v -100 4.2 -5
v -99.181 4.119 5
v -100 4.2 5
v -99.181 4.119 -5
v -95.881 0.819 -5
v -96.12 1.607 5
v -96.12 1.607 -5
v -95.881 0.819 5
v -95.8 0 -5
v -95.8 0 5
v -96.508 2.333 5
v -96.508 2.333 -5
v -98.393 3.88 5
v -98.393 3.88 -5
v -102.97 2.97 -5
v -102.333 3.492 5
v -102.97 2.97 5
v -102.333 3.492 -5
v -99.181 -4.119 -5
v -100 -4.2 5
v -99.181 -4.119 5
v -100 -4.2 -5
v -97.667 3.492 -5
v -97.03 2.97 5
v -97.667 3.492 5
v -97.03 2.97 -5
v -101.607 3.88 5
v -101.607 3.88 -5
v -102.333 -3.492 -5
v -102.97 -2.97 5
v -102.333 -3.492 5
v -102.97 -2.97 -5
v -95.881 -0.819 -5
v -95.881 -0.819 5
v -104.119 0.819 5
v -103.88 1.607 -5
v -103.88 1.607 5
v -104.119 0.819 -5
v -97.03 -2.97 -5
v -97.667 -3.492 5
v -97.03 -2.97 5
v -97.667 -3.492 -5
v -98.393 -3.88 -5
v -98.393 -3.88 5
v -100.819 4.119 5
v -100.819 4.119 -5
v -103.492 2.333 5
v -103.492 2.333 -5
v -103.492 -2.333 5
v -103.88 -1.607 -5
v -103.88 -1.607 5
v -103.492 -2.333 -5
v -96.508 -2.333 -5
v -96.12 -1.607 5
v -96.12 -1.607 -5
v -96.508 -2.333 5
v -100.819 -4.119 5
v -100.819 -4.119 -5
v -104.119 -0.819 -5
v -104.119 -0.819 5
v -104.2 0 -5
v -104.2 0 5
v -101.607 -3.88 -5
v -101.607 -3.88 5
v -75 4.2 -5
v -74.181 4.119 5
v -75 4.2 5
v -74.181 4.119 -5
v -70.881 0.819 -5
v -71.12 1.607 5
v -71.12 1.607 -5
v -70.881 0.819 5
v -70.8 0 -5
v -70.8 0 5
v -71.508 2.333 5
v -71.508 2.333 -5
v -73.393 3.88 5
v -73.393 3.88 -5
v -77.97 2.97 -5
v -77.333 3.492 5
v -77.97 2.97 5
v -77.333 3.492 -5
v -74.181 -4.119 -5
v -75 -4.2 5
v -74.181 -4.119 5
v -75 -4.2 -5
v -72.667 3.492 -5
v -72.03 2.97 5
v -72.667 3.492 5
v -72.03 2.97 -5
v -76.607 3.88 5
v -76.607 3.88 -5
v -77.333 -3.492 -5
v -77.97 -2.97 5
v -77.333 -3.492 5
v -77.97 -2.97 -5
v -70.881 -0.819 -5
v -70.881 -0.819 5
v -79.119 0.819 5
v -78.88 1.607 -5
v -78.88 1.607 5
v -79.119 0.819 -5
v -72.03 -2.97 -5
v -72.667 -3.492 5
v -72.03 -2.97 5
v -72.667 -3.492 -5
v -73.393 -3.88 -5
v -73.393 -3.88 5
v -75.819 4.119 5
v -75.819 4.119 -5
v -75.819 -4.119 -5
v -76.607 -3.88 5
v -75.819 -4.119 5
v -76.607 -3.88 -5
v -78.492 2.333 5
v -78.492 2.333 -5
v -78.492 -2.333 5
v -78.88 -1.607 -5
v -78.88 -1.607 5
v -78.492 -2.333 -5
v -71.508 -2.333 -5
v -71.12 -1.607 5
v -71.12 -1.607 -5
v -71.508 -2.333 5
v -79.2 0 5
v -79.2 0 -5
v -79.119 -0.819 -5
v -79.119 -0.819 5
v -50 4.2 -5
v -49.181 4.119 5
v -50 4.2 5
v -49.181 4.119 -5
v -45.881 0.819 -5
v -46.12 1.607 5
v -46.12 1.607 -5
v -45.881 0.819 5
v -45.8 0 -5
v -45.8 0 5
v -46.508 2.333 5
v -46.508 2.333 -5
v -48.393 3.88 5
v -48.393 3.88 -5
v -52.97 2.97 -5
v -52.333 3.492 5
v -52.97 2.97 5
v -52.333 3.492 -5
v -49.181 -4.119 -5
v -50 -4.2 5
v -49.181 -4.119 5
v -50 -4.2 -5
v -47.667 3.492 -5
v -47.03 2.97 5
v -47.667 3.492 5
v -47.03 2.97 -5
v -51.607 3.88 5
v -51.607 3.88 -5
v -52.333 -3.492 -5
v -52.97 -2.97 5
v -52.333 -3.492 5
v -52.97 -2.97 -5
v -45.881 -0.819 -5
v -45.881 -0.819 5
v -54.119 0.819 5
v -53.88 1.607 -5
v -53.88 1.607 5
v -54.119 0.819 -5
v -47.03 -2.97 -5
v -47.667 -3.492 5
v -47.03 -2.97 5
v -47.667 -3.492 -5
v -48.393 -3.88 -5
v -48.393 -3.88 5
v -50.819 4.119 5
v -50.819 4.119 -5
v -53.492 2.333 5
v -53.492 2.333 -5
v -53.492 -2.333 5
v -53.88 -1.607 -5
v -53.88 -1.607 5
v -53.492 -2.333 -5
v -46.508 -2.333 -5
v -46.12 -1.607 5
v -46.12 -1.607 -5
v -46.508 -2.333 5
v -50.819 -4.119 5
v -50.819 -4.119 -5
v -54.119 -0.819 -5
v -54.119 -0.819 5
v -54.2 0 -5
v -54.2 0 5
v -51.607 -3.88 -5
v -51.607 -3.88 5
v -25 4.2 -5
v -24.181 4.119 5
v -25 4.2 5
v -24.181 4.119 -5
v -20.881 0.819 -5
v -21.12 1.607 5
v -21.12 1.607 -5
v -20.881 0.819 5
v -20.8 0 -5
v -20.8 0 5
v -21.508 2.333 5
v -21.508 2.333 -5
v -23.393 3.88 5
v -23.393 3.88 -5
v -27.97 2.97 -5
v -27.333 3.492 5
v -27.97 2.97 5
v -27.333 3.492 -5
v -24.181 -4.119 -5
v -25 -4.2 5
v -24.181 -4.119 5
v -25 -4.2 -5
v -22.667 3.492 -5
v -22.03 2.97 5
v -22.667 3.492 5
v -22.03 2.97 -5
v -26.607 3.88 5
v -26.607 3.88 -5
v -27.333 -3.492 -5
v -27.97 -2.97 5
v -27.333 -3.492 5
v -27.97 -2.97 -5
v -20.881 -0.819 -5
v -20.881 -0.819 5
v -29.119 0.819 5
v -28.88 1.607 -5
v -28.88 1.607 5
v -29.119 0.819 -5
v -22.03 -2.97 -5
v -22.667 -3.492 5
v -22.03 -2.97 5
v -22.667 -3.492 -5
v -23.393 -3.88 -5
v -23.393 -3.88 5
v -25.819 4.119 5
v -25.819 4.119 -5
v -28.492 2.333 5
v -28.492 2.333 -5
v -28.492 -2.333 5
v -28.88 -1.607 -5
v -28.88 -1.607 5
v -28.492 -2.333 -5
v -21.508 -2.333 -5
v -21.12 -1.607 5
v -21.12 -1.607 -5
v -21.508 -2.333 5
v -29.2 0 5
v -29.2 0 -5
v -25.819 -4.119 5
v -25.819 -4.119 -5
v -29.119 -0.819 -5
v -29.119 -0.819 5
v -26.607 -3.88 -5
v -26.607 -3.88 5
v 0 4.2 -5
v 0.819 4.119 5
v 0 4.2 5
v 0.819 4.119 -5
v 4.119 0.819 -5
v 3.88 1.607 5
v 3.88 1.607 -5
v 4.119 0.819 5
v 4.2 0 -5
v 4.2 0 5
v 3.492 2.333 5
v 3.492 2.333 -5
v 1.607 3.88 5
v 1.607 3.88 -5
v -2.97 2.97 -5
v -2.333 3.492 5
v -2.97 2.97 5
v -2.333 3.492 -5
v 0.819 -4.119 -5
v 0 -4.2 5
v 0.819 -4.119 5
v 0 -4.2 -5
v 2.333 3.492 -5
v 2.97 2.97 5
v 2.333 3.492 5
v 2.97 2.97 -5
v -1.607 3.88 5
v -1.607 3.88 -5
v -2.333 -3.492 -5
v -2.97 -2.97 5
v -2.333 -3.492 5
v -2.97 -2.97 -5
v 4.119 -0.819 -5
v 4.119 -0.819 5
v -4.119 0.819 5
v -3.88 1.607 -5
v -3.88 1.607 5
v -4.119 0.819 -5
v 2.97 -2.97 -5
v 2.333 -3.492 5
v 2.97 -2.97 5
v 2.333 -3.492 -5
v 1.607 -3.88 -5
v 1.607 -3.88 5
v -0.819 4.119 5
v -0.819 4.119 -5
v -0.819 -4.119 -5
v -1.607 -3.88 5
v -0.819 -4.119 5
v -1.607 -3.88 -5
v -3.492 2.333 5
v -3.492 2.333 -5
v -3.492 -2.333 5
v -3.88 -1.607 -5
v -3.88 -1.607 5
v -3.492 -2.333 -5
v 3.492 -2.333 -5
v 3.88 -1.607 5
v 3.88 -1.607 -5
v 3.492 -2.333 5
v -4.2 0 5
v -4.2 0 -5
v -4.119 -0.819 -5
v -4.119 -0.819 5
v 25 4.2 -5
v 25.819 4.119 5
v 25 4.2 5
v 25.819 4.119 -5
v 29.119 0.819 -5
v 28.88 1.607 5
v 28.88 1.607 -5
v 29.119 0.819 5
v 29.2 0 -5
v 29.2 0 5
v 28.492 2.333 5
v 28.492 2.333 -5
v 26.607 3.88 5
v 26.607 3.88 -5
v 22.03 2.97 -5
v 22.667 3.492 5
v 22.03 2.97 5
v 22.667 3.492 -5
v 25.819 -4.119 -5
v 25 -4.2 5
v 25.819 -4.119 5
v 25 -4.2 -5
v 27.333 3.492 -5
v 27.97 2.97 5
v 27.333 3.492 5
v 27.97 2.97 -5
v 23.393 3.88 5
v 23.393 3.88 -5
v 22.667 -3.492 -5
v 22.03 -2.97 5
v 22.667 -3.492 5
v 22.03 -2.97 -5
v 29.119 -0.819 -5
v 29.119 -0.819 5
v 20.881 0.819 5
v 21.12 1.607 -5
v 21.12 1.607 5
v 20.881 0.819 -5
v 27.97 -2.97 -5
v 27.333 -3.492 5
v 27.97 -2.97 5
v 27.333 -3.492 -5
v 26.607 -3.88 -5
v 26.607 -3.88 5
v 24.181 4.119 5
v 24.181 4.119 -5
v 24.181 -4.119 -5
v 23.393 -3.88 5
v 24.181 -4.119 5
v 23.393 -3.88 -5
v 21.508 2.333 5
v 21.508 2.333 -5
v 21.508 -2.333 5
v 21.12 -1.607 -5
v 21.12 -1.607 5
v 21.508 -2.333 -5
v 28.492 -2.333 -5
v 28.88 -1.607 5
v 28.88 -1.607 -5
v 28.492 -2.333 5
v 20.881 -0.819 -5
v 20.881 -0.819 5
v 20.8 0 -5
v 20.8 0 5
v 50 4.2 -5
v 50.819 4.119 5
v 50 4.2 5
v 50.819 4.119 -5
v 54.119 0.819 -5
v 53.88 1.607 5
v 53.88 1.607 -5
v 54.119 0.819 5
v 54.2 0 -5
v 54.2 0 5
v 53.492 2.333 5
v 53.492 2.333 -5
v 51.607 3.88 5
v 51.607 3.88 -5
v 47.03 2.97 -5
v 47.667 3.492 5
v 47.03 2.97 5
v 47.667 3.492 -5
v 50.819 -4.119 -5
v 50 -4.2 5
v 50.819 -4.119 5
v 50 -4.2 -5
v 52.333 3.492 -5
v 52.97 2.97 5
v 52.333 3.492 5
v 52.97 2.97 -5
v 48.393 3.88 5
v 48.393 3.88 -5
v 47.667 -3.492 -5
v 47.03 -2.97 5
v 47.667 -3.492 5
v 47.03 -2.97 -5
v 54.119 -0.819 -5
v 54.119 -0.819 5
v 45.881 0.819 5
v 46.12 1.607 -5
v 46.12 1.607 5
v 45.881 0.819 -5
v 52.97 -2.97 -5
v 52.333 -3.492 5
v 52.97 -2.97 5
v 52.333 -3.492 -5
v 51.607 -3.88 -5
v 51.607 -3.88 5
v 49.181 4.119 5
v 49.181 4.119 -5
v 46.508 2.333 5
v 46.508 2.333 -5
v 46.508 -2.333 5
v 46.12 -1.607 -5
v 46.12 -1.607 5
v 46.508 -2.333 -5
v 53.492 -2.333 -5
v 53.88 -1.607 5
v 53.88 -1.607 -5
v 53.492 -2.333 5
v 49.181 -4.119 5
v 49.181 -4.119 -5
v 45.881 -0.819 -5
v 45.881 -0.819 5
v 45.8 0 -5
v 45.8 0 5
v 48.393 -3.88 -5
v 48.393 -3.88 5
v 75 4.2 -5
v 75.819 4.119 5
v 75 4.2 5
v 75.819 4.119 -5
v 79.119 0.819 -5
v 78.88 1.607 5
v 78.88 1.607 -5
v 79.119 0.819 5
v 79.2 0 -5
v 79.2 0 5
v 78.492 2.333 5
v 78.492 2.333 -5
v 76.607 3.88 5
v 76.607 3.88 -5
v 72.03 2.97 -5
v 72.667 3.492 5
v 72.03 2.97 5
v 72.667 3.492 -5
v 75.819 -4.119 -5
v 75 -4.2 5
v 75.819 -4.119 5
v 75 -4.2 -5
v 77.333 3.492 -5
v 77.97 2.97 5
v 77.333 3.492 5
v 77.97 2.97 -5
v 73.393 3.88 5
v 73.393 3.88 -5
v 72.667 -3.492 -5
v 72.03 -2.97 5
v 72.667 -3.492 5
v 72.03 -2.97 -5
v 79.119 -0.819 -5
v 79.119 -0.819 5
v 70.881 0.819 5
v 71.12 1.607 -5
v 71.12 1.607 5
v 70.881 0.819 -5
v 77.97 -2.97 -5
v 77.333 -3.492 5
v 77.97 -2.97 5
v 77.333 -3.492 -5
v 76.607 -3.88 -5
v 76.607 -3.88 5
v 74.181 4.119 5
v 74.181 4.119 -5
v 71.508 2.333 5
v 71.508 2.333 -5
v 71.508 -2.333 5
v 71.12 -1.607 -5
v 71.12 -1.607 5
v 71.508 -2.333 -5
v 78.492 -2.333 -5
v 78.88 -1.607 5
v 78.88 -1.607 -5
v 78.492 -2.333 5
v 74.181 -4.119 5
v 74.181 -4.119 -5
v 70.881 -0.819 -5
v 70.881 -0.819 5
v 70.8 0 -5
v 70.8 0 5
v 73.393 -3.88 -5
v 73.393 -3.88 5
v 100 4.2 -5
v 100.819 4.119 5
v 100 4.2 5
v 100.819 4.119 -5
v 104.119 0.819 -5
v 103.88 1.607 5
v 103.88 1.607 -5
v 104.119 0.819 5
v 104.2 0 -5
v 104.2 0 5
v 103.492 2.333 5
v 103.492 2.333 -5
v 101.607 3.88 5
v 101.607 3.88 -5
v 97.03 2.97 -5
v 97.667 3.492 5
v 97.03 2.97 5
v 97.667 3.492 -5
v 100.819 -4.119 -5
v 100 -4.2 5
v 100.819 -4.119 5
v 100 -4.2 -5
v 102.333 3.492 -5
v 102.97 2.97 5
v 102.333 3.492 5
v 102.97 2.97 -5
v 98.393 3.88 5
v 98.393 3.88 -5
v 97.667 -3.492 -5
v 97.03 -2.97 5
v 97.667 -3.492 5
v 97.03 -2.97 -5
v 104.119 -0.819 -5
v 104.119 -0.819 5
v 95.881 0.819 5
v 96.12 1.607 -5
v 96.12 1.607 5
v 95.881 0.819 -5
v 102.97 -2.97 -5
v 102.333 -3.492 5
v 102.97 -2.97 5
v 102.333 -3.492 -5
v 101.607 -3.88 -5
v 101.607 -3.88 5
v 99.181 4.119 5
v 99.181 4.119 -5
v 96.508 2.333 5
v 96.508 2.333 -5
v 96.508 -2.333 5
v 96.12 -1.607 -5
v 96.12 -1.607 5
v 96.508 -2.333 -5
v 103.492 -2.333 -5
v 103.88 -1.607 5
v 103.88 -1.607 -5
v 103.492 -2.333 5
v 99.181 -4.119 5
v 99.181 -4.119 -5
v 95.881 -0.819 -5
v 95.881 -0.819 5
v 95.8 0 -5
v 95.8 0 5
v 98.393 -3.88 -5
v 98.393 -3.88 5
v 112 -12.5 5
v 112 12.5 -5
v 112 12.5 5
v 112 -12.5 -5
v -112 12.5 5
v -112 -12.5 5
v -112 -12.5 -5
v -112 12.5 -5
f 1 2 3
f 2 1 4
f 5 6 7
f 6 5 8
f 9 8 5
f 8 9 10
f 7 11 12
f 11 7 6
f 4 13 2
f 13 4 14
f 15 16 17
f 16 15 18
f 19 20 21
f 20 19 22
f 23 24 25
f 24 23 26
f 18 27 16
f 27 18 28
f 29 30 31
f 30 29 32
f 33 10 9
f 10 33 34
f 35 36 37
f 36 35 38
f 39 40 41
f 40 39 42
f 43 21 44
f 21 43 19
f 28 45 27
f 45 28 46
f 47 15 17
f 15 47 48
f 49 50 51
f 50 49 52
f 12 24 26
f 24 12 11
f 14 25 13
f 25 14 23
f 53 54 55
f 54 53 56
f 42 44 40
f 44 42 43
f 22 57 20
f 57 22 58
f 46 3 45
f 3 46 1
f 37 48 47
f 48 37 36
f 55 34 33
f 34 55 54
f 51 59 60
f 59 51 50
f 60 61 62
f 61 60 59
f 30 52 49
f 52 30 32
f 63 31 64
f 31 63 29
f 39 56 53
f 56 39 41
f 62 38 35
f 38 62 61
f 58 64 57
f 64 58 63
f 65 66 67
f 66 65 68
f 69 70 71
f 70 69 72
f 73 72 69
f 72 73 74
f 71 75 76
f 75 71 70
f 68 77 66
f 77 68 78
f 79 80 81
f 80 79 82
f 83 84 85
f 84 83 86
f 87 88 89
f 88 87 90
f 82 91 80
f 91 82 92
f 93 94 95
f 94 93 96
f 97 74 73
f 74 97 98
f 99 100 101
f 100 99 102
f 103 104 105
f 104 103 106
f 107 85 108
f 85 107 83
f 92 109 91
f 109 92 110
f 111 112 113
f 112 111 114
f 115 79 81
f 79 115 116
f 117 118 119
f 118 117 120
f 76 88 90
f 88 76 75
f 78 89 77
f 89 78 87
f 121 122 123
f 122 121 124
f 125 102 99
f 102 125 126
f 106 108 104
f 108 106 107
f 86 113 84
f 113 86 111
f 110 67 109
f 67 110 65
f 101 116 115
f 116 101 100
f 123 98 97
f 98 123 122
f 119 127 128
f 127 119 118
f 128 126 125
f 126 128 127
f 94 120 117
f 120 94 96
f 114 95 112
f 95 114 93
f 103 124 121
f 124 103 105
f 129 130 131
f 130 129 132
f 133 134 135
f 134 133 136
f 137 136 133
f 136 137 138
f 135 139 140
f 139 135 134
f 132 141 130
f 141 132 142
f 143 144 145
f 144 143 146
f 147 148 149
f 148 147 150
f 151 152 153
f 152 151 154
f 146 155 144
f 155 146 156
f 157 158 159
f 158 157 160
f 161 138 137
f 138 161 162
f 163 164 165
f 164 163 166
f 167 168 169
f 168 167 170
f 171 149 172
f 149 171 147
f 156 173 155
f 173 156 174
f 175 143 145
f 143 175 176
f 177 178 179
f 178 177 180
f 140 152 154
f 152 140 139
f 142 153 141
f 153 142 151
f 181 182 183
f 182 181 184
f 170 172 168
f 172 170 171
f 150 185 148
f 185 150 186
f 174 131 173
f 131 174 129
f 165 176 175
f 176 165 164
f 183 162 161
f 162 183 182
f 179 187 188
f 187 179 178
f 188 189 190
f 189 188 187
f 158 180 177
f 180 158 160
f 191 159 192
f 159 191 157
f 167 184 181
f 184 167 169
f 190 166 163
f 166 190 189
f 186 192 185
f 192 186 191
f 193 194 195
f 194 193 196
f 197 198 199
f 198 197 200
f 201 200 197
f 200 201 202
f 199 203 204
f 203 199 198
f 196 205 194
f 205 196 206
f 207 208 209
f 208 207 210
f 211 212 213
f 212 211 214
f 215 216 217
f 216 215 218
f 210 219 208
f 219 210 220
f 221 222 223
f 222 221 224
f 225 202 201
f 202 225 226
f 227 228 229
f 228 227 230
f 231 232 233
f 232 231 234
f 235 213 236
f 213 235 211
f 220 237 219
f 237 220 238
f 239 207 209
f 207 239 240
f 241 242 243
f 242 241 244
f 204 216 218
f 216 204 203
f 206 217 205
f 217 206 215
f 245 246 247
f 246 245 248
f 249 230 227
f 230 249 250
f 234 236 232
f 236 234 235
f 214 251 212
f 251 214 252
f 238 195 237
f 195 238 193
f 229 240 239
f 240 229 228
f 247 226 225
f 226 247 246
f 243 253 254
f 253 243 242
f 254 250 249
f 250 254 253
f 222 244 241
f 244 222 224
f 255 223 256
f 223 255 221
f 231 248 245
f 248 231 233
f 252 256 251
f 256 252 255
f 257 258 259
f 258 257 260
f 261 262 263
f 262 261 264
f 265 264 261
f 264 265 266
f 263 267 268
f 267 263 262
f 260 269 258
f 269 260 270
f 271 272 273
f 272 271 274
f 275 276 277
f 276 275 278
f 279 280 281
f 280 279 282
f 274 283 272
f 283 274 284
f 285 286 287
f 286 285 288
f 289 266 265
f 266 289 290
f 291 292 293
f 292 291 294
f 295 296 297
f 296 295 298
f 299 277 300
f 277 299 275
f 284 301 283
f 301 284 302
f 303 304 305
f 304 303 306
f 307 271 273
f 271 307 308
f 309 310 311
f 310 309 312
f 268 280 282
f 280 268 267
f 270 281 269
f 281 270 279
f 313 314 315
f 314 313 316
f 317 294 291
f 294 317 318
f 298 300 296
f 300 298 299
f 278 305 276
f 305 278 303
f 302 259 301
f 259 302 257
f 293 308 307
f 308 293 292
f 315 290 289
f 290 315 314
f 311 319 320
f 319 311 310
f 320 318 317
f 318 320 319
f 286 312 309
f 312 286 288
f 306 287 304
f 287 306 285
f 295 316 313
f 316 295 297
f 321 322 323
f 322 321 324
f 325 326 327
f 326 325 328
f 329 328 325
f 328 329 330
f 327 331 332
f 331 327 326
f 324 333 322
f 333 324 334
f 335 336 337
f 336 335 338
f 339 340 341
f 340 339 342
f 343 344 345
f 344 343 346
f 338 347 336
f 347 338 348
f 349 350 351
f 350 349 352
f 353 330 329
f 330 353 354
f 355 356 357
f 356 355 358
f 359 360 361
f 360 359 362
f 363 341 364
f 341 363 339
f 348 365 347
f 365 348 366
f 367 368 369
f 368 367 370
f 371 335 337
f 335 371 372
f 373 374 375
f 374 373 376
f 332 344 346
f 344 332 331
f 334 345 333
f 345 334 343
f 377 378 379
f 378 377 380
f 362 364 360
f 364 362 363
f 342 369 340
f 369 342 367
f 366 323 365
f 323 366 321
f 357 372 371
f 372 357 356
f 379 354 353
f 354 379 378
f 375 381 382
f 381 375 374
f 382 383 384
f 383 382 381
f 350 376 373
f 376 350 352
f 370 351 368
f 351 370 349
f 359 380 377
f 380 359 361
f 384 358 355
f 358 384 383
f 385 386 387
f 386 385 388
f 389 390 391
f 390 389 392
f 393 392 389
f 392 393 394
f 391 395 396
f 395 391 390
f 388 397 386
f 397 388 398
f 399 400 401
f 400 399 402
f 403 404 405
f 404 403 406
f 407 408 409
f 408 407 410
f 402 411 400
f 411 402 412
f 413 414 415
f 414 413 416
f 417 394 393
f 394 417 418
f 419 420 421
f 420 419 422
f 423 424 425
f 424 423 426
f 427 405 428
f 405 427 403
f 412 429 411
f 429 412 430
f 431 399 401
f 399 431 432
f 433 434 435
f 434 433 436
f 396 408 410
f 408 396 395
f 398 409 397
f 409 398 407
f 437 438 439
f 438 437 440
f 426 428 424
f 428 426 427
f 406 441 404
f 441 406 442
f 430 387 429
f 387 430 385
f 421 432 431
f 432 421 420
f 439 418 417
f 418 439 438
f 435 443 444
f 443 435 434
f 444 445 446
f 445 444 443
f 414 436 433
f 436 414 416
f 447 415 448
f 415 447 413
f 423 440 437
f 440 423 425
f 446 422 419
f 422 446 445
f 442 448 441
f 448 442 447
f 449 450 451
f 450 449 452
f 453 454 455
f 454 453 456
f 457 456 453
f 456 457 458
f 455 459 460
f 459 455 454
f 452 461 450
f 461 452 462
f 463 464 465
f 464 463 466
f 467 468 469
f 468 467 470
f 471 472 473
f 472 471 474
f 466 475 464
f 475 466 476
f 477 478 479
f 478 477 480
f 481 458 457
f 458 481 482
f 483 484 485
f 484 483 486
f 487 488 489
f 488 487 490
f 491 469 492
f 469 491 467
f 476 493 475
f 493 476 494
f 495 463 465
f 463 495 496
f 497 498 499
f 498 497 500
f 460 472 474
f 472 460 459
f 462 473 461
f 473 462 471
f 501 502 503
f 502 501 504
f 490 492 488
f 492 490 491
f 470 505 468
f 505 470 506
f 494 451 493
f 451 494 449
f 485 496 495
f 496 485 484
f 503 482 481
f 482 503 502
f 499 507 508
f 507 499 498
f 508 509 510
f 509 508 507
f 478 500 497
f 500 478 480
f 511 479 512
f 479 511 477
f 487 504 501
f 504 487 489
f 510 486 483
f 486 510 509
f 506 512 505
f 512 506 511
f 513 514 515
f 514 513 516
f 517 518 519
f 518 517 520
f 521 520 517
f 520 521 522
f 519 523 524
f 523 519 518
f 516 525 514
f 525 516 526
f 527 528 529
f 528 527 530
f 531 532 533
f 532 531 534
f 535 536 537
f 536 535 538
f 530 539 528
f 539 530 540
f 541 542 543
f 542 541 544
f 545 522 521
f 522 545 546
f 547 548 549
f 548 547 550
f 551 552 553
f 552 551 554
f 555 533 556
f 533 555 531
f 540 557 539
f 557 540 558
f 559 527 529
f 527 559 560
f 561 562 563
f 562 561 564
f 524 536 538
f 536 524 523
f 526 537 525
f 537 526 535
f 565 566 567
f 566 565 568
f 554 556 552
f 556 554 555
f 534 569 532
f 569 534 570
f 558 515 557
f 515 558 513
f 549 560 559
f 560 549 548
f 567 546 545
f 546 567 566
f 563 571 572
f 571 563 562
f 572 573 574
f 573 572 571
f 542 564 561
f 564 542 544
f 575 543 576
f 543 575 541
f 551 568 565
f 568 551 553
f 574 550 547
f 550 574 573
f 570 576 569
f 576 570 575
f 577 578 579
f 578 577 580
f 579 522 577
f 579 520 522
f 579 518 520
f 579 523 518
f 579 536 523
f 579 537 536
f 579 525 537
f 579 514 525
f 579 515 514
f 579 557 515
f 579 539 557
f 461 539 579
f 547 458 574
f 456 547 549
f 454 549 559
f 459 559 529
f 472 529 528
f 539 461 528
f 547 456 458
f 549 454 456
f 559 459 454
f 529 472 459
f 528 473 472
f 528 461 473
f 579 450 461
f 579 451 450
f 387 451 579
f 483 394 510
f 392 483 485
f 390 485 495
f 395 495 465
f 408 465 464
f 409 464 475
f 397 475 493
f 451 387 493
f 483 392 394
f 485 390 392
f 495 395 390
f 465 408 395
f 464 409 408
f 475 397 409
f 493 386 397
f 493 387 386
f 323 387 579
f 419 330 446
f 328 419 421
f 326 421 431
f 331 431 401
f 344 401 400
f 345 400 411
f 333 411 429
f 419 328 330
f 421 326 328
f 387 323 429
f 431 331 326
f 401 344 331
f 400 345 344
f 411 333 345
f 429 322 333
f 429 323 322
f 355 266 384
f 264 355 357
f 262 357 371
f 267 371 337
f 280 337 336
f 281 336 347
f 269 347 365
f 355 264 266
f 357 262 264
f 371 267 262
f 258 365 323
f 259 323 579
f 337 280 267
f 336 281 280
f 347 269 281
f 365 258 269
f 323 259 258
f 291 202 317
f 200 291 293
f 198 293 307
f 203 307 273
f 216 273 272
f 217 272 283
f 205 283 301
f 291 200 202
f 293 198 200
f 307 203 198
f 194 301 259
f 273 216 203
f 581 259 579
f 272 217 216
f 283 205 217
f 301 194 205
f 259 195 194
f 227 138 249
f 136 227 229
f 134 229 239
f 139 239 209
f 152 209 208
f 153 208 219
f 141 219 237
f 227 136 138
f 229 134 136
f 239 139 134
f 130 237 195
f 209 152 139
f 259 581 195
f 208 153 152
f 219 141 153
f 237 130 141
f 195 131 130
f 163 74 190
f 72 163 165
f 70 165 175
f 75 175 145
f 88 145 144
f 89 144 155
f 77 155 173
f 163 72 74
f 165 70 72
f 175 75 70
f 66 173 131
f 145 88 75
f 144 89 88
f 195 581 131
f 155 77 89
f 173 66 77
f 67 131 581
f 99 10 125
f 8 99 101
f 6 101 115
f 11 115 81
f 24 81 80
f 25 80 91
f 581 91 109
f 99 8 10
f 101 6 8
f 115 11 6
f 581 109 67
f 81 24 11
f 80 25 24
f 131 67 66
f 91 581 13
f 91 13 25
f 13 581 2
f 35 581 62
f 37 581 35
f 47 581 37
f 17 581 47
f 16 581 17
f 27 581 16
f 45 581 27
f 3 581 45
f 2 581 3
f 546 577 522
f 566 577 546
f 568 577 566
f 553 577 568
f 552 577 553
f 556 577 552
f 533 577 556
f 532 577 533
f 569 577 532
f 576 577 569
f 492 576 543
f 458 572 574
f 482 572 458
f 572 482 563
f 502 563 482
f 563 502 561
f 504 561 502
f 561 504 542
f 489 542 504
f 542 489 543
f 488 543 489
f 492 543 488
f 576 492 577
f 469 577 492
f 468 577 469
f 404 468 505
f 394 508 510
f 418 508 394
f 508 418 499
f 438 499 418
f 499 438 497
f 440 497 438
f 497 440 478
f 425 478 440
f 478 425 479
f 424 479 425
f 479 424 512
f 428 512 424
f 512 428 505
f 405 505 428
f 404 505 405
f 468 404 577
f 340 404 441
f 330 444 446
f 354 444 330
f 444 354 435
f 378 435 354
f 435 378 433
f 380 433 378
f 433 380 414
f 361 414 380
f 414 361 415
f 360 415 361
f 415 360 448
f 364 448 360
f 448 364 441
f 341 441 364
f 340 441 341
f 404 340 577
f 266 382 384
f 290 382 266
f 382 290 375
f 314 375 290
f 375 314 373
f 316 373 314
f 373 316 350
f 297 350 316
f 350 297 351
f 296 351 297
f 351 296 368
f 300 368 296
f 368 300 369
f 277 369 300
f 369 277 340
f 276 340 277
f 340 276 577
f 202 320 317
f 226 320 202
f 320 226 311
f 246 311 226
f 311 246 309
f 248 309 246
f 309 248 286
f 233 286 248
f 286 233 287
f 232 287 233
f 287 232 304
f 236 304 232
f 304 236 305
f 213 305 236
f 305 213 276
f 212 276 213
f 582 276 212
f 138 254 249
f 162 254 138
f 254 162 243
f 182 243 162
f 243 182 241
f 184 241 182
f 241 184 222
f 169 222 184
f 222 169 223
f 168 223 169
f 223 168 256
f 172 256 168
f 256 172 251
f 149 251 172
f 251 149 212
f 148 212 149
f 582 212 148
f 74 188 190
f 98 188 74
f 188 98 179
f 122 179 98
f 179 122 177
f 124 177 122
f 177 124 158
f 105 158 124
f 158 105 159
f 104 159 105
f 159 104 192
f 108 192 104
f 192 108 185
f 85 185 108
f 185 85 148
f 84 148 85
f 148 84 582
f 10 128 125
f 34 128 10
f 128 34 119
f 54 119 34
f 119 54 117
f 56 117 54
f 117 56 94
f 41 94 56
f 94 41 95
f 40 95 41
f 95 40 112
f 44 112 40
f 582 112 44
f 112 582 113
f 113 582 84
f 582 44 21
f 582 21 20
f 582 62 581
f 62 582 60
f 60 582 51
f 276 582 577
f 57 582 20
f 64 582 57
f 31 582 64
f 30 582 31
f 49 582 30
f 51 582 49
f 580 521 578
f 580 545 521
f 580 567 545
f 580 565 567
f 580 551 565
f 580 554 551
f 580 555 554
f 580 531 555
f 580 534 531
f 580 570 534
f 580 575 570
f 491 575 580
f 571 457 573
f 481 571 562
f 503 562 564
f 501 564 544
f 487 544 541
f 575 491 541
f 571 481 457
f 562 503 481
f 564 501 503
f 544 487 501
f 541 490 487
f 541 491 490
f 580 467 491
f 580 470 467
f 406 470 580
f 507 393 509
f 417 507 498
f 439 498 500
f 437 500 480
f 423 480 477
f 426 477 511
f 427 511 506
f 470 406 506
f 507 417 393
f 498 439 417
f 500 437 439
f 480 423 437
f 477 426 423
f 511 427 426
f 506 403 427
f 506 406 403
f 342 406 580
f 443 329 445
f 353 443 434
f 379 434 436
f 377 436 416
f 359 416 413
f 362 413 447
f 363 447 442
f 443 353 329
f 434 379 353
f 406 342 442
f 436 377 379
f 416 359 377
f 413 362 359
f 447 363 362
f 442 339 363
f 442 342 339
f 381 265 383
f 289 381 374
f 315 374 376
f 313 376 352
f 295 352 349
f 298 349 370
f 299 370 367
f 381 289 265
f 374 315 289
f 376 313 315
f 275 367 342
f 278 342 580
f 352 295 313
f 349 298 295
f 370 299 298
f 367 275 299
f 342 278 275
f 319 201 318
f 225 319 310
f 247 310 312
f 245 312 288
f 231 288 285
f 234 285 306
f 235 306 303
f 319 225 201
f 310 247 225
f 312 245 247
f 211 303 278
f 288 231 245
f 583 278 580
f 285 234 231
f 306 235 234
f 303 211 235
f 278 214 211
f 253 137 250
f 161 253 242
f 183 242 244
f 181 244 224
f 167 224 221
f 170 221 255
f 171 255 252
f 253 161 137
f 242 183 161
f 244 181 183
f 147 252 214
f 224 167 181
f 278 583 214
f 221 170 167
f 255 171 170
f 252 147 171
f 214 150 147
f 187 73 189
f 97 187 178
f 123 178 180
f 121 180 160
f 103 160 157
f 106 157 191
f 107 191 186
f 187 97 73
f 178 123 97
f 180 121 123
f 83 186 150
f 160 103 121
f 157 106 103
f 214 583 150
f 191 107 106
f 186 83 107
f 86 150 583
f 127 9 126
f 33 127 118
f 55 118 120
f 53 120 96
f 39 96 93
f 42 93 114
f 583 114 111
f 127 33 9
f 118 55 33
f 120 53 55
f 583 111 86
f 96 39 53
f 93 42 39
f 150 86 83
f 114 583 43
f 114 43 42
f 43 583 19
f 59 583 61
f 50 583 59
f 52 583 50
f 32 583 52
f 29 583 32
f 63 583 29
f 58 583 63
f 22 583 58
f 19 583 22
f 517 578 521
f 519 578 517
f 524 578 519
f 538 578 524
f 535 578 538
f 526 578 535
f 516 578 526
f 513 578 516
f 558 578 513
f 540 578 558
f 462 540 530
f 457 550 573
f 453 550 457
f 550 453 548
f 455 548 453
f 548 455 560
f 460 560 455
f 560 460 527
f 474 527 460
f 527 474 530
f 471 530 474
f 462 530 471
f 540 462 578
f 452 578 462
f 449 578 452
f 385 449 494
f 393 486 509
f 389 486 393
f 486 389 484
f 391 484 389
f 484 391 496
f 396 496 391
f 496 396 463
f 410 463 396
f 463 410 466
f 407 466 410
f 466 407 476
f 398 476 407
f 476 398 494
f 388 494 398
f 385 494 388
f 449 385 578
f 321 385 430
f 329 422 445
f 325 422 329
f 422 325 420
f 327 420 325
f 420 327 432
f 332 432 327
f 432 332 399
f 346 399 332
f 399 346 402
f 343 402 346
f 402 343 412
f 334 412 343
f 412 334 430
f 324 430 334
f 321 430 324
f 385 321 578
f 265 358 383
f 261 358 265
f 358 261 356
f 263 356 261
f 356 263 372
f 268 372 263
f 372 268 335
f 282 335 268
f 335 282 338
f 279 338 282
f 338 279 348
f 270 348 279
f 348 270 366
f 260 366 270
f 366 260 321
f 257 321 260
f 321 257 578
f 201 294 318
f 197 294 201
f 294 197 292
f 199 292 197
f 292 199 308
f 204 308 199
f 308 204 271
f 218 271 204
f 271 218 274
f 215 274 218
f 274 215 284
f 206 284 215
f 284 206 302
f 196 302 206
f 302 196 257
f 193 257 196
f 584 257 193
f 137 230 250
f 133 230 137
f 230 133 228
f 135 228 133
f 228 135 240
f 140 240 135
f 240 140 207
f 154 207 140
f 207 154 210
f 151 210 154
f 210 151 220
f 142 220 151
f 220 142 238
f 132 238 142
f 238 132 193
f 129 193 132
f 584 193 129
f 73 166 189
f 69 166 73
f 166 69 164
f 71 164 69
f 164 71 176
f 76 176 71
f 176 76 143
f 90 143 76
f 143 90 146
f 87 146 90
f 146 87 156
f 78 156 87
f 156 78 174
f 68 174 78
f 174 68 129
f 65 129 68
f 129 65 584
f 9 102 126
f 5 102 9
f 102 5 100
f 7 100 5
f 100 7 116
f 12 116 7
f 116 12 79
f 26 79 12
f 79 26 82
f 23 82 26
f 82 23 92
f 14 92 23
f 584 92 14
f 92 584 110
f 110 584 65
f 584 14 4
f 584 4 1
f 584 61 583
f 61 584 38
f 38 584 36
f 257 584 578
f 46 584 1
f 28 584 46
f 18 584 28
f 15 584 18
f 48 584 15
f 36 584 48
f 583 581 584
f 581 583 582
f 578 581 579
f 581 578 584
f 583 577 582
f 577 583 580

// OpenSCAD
$fn = 32;

// ----------------------------------------------------------------------
// Hole bar, 9 x Ø8.4
// row layout, 12 mm edge offset
// ----------------------------------------------------------------------

// --- parameters (mm) ---
bar_w = 25;    // bar width (Y)
bar_t = 10;    // bar thickness (Z)
holes = 9;     // holes per row
hole_d = 8.4;  // hole diameter
edge = 12;     // offset from the bar end to the first hole
pitch = 25;    // pitch between neighbouring holes

// --- derived feature positions (mm) ---
span = (holes - 1) * pitch;   // = 200   distance between the end holes
bar_l = span + 2 * edge;      // = 224   overall bar length
start_x = -bar_l / 2 + edge;  // = -100   X of the first hole
feature_centers = [
  [start_x + 0 * pitch, 0],
  [start_x + 1 * pitch, 0],
  [start_x + 2 * pitch, 0],
  [start_x + 3 * pitch, 0],
  [start_x + 4 * pitch, 0],
  [start_x + 5 * pitch, 0],
  [start_x + 6 * pitch, 0],
  [start_x + 7 * pitch, 0],
  [start_x + 8 * pitch, 0]
];   // hole centres of the first row

// bar with one row of holes, drilled from feature_centers
difference() {
  translate([-bar_l / 2, -bar_w / 2, -bar_t / 2]) cube([bar_l, bar_w, bar_t]);
  for (centre = feature_centers)
    translate([centre[0], centre[1], 0])
      cylinder(d = hole_d, h = bar_t + 2, center = true);
}
